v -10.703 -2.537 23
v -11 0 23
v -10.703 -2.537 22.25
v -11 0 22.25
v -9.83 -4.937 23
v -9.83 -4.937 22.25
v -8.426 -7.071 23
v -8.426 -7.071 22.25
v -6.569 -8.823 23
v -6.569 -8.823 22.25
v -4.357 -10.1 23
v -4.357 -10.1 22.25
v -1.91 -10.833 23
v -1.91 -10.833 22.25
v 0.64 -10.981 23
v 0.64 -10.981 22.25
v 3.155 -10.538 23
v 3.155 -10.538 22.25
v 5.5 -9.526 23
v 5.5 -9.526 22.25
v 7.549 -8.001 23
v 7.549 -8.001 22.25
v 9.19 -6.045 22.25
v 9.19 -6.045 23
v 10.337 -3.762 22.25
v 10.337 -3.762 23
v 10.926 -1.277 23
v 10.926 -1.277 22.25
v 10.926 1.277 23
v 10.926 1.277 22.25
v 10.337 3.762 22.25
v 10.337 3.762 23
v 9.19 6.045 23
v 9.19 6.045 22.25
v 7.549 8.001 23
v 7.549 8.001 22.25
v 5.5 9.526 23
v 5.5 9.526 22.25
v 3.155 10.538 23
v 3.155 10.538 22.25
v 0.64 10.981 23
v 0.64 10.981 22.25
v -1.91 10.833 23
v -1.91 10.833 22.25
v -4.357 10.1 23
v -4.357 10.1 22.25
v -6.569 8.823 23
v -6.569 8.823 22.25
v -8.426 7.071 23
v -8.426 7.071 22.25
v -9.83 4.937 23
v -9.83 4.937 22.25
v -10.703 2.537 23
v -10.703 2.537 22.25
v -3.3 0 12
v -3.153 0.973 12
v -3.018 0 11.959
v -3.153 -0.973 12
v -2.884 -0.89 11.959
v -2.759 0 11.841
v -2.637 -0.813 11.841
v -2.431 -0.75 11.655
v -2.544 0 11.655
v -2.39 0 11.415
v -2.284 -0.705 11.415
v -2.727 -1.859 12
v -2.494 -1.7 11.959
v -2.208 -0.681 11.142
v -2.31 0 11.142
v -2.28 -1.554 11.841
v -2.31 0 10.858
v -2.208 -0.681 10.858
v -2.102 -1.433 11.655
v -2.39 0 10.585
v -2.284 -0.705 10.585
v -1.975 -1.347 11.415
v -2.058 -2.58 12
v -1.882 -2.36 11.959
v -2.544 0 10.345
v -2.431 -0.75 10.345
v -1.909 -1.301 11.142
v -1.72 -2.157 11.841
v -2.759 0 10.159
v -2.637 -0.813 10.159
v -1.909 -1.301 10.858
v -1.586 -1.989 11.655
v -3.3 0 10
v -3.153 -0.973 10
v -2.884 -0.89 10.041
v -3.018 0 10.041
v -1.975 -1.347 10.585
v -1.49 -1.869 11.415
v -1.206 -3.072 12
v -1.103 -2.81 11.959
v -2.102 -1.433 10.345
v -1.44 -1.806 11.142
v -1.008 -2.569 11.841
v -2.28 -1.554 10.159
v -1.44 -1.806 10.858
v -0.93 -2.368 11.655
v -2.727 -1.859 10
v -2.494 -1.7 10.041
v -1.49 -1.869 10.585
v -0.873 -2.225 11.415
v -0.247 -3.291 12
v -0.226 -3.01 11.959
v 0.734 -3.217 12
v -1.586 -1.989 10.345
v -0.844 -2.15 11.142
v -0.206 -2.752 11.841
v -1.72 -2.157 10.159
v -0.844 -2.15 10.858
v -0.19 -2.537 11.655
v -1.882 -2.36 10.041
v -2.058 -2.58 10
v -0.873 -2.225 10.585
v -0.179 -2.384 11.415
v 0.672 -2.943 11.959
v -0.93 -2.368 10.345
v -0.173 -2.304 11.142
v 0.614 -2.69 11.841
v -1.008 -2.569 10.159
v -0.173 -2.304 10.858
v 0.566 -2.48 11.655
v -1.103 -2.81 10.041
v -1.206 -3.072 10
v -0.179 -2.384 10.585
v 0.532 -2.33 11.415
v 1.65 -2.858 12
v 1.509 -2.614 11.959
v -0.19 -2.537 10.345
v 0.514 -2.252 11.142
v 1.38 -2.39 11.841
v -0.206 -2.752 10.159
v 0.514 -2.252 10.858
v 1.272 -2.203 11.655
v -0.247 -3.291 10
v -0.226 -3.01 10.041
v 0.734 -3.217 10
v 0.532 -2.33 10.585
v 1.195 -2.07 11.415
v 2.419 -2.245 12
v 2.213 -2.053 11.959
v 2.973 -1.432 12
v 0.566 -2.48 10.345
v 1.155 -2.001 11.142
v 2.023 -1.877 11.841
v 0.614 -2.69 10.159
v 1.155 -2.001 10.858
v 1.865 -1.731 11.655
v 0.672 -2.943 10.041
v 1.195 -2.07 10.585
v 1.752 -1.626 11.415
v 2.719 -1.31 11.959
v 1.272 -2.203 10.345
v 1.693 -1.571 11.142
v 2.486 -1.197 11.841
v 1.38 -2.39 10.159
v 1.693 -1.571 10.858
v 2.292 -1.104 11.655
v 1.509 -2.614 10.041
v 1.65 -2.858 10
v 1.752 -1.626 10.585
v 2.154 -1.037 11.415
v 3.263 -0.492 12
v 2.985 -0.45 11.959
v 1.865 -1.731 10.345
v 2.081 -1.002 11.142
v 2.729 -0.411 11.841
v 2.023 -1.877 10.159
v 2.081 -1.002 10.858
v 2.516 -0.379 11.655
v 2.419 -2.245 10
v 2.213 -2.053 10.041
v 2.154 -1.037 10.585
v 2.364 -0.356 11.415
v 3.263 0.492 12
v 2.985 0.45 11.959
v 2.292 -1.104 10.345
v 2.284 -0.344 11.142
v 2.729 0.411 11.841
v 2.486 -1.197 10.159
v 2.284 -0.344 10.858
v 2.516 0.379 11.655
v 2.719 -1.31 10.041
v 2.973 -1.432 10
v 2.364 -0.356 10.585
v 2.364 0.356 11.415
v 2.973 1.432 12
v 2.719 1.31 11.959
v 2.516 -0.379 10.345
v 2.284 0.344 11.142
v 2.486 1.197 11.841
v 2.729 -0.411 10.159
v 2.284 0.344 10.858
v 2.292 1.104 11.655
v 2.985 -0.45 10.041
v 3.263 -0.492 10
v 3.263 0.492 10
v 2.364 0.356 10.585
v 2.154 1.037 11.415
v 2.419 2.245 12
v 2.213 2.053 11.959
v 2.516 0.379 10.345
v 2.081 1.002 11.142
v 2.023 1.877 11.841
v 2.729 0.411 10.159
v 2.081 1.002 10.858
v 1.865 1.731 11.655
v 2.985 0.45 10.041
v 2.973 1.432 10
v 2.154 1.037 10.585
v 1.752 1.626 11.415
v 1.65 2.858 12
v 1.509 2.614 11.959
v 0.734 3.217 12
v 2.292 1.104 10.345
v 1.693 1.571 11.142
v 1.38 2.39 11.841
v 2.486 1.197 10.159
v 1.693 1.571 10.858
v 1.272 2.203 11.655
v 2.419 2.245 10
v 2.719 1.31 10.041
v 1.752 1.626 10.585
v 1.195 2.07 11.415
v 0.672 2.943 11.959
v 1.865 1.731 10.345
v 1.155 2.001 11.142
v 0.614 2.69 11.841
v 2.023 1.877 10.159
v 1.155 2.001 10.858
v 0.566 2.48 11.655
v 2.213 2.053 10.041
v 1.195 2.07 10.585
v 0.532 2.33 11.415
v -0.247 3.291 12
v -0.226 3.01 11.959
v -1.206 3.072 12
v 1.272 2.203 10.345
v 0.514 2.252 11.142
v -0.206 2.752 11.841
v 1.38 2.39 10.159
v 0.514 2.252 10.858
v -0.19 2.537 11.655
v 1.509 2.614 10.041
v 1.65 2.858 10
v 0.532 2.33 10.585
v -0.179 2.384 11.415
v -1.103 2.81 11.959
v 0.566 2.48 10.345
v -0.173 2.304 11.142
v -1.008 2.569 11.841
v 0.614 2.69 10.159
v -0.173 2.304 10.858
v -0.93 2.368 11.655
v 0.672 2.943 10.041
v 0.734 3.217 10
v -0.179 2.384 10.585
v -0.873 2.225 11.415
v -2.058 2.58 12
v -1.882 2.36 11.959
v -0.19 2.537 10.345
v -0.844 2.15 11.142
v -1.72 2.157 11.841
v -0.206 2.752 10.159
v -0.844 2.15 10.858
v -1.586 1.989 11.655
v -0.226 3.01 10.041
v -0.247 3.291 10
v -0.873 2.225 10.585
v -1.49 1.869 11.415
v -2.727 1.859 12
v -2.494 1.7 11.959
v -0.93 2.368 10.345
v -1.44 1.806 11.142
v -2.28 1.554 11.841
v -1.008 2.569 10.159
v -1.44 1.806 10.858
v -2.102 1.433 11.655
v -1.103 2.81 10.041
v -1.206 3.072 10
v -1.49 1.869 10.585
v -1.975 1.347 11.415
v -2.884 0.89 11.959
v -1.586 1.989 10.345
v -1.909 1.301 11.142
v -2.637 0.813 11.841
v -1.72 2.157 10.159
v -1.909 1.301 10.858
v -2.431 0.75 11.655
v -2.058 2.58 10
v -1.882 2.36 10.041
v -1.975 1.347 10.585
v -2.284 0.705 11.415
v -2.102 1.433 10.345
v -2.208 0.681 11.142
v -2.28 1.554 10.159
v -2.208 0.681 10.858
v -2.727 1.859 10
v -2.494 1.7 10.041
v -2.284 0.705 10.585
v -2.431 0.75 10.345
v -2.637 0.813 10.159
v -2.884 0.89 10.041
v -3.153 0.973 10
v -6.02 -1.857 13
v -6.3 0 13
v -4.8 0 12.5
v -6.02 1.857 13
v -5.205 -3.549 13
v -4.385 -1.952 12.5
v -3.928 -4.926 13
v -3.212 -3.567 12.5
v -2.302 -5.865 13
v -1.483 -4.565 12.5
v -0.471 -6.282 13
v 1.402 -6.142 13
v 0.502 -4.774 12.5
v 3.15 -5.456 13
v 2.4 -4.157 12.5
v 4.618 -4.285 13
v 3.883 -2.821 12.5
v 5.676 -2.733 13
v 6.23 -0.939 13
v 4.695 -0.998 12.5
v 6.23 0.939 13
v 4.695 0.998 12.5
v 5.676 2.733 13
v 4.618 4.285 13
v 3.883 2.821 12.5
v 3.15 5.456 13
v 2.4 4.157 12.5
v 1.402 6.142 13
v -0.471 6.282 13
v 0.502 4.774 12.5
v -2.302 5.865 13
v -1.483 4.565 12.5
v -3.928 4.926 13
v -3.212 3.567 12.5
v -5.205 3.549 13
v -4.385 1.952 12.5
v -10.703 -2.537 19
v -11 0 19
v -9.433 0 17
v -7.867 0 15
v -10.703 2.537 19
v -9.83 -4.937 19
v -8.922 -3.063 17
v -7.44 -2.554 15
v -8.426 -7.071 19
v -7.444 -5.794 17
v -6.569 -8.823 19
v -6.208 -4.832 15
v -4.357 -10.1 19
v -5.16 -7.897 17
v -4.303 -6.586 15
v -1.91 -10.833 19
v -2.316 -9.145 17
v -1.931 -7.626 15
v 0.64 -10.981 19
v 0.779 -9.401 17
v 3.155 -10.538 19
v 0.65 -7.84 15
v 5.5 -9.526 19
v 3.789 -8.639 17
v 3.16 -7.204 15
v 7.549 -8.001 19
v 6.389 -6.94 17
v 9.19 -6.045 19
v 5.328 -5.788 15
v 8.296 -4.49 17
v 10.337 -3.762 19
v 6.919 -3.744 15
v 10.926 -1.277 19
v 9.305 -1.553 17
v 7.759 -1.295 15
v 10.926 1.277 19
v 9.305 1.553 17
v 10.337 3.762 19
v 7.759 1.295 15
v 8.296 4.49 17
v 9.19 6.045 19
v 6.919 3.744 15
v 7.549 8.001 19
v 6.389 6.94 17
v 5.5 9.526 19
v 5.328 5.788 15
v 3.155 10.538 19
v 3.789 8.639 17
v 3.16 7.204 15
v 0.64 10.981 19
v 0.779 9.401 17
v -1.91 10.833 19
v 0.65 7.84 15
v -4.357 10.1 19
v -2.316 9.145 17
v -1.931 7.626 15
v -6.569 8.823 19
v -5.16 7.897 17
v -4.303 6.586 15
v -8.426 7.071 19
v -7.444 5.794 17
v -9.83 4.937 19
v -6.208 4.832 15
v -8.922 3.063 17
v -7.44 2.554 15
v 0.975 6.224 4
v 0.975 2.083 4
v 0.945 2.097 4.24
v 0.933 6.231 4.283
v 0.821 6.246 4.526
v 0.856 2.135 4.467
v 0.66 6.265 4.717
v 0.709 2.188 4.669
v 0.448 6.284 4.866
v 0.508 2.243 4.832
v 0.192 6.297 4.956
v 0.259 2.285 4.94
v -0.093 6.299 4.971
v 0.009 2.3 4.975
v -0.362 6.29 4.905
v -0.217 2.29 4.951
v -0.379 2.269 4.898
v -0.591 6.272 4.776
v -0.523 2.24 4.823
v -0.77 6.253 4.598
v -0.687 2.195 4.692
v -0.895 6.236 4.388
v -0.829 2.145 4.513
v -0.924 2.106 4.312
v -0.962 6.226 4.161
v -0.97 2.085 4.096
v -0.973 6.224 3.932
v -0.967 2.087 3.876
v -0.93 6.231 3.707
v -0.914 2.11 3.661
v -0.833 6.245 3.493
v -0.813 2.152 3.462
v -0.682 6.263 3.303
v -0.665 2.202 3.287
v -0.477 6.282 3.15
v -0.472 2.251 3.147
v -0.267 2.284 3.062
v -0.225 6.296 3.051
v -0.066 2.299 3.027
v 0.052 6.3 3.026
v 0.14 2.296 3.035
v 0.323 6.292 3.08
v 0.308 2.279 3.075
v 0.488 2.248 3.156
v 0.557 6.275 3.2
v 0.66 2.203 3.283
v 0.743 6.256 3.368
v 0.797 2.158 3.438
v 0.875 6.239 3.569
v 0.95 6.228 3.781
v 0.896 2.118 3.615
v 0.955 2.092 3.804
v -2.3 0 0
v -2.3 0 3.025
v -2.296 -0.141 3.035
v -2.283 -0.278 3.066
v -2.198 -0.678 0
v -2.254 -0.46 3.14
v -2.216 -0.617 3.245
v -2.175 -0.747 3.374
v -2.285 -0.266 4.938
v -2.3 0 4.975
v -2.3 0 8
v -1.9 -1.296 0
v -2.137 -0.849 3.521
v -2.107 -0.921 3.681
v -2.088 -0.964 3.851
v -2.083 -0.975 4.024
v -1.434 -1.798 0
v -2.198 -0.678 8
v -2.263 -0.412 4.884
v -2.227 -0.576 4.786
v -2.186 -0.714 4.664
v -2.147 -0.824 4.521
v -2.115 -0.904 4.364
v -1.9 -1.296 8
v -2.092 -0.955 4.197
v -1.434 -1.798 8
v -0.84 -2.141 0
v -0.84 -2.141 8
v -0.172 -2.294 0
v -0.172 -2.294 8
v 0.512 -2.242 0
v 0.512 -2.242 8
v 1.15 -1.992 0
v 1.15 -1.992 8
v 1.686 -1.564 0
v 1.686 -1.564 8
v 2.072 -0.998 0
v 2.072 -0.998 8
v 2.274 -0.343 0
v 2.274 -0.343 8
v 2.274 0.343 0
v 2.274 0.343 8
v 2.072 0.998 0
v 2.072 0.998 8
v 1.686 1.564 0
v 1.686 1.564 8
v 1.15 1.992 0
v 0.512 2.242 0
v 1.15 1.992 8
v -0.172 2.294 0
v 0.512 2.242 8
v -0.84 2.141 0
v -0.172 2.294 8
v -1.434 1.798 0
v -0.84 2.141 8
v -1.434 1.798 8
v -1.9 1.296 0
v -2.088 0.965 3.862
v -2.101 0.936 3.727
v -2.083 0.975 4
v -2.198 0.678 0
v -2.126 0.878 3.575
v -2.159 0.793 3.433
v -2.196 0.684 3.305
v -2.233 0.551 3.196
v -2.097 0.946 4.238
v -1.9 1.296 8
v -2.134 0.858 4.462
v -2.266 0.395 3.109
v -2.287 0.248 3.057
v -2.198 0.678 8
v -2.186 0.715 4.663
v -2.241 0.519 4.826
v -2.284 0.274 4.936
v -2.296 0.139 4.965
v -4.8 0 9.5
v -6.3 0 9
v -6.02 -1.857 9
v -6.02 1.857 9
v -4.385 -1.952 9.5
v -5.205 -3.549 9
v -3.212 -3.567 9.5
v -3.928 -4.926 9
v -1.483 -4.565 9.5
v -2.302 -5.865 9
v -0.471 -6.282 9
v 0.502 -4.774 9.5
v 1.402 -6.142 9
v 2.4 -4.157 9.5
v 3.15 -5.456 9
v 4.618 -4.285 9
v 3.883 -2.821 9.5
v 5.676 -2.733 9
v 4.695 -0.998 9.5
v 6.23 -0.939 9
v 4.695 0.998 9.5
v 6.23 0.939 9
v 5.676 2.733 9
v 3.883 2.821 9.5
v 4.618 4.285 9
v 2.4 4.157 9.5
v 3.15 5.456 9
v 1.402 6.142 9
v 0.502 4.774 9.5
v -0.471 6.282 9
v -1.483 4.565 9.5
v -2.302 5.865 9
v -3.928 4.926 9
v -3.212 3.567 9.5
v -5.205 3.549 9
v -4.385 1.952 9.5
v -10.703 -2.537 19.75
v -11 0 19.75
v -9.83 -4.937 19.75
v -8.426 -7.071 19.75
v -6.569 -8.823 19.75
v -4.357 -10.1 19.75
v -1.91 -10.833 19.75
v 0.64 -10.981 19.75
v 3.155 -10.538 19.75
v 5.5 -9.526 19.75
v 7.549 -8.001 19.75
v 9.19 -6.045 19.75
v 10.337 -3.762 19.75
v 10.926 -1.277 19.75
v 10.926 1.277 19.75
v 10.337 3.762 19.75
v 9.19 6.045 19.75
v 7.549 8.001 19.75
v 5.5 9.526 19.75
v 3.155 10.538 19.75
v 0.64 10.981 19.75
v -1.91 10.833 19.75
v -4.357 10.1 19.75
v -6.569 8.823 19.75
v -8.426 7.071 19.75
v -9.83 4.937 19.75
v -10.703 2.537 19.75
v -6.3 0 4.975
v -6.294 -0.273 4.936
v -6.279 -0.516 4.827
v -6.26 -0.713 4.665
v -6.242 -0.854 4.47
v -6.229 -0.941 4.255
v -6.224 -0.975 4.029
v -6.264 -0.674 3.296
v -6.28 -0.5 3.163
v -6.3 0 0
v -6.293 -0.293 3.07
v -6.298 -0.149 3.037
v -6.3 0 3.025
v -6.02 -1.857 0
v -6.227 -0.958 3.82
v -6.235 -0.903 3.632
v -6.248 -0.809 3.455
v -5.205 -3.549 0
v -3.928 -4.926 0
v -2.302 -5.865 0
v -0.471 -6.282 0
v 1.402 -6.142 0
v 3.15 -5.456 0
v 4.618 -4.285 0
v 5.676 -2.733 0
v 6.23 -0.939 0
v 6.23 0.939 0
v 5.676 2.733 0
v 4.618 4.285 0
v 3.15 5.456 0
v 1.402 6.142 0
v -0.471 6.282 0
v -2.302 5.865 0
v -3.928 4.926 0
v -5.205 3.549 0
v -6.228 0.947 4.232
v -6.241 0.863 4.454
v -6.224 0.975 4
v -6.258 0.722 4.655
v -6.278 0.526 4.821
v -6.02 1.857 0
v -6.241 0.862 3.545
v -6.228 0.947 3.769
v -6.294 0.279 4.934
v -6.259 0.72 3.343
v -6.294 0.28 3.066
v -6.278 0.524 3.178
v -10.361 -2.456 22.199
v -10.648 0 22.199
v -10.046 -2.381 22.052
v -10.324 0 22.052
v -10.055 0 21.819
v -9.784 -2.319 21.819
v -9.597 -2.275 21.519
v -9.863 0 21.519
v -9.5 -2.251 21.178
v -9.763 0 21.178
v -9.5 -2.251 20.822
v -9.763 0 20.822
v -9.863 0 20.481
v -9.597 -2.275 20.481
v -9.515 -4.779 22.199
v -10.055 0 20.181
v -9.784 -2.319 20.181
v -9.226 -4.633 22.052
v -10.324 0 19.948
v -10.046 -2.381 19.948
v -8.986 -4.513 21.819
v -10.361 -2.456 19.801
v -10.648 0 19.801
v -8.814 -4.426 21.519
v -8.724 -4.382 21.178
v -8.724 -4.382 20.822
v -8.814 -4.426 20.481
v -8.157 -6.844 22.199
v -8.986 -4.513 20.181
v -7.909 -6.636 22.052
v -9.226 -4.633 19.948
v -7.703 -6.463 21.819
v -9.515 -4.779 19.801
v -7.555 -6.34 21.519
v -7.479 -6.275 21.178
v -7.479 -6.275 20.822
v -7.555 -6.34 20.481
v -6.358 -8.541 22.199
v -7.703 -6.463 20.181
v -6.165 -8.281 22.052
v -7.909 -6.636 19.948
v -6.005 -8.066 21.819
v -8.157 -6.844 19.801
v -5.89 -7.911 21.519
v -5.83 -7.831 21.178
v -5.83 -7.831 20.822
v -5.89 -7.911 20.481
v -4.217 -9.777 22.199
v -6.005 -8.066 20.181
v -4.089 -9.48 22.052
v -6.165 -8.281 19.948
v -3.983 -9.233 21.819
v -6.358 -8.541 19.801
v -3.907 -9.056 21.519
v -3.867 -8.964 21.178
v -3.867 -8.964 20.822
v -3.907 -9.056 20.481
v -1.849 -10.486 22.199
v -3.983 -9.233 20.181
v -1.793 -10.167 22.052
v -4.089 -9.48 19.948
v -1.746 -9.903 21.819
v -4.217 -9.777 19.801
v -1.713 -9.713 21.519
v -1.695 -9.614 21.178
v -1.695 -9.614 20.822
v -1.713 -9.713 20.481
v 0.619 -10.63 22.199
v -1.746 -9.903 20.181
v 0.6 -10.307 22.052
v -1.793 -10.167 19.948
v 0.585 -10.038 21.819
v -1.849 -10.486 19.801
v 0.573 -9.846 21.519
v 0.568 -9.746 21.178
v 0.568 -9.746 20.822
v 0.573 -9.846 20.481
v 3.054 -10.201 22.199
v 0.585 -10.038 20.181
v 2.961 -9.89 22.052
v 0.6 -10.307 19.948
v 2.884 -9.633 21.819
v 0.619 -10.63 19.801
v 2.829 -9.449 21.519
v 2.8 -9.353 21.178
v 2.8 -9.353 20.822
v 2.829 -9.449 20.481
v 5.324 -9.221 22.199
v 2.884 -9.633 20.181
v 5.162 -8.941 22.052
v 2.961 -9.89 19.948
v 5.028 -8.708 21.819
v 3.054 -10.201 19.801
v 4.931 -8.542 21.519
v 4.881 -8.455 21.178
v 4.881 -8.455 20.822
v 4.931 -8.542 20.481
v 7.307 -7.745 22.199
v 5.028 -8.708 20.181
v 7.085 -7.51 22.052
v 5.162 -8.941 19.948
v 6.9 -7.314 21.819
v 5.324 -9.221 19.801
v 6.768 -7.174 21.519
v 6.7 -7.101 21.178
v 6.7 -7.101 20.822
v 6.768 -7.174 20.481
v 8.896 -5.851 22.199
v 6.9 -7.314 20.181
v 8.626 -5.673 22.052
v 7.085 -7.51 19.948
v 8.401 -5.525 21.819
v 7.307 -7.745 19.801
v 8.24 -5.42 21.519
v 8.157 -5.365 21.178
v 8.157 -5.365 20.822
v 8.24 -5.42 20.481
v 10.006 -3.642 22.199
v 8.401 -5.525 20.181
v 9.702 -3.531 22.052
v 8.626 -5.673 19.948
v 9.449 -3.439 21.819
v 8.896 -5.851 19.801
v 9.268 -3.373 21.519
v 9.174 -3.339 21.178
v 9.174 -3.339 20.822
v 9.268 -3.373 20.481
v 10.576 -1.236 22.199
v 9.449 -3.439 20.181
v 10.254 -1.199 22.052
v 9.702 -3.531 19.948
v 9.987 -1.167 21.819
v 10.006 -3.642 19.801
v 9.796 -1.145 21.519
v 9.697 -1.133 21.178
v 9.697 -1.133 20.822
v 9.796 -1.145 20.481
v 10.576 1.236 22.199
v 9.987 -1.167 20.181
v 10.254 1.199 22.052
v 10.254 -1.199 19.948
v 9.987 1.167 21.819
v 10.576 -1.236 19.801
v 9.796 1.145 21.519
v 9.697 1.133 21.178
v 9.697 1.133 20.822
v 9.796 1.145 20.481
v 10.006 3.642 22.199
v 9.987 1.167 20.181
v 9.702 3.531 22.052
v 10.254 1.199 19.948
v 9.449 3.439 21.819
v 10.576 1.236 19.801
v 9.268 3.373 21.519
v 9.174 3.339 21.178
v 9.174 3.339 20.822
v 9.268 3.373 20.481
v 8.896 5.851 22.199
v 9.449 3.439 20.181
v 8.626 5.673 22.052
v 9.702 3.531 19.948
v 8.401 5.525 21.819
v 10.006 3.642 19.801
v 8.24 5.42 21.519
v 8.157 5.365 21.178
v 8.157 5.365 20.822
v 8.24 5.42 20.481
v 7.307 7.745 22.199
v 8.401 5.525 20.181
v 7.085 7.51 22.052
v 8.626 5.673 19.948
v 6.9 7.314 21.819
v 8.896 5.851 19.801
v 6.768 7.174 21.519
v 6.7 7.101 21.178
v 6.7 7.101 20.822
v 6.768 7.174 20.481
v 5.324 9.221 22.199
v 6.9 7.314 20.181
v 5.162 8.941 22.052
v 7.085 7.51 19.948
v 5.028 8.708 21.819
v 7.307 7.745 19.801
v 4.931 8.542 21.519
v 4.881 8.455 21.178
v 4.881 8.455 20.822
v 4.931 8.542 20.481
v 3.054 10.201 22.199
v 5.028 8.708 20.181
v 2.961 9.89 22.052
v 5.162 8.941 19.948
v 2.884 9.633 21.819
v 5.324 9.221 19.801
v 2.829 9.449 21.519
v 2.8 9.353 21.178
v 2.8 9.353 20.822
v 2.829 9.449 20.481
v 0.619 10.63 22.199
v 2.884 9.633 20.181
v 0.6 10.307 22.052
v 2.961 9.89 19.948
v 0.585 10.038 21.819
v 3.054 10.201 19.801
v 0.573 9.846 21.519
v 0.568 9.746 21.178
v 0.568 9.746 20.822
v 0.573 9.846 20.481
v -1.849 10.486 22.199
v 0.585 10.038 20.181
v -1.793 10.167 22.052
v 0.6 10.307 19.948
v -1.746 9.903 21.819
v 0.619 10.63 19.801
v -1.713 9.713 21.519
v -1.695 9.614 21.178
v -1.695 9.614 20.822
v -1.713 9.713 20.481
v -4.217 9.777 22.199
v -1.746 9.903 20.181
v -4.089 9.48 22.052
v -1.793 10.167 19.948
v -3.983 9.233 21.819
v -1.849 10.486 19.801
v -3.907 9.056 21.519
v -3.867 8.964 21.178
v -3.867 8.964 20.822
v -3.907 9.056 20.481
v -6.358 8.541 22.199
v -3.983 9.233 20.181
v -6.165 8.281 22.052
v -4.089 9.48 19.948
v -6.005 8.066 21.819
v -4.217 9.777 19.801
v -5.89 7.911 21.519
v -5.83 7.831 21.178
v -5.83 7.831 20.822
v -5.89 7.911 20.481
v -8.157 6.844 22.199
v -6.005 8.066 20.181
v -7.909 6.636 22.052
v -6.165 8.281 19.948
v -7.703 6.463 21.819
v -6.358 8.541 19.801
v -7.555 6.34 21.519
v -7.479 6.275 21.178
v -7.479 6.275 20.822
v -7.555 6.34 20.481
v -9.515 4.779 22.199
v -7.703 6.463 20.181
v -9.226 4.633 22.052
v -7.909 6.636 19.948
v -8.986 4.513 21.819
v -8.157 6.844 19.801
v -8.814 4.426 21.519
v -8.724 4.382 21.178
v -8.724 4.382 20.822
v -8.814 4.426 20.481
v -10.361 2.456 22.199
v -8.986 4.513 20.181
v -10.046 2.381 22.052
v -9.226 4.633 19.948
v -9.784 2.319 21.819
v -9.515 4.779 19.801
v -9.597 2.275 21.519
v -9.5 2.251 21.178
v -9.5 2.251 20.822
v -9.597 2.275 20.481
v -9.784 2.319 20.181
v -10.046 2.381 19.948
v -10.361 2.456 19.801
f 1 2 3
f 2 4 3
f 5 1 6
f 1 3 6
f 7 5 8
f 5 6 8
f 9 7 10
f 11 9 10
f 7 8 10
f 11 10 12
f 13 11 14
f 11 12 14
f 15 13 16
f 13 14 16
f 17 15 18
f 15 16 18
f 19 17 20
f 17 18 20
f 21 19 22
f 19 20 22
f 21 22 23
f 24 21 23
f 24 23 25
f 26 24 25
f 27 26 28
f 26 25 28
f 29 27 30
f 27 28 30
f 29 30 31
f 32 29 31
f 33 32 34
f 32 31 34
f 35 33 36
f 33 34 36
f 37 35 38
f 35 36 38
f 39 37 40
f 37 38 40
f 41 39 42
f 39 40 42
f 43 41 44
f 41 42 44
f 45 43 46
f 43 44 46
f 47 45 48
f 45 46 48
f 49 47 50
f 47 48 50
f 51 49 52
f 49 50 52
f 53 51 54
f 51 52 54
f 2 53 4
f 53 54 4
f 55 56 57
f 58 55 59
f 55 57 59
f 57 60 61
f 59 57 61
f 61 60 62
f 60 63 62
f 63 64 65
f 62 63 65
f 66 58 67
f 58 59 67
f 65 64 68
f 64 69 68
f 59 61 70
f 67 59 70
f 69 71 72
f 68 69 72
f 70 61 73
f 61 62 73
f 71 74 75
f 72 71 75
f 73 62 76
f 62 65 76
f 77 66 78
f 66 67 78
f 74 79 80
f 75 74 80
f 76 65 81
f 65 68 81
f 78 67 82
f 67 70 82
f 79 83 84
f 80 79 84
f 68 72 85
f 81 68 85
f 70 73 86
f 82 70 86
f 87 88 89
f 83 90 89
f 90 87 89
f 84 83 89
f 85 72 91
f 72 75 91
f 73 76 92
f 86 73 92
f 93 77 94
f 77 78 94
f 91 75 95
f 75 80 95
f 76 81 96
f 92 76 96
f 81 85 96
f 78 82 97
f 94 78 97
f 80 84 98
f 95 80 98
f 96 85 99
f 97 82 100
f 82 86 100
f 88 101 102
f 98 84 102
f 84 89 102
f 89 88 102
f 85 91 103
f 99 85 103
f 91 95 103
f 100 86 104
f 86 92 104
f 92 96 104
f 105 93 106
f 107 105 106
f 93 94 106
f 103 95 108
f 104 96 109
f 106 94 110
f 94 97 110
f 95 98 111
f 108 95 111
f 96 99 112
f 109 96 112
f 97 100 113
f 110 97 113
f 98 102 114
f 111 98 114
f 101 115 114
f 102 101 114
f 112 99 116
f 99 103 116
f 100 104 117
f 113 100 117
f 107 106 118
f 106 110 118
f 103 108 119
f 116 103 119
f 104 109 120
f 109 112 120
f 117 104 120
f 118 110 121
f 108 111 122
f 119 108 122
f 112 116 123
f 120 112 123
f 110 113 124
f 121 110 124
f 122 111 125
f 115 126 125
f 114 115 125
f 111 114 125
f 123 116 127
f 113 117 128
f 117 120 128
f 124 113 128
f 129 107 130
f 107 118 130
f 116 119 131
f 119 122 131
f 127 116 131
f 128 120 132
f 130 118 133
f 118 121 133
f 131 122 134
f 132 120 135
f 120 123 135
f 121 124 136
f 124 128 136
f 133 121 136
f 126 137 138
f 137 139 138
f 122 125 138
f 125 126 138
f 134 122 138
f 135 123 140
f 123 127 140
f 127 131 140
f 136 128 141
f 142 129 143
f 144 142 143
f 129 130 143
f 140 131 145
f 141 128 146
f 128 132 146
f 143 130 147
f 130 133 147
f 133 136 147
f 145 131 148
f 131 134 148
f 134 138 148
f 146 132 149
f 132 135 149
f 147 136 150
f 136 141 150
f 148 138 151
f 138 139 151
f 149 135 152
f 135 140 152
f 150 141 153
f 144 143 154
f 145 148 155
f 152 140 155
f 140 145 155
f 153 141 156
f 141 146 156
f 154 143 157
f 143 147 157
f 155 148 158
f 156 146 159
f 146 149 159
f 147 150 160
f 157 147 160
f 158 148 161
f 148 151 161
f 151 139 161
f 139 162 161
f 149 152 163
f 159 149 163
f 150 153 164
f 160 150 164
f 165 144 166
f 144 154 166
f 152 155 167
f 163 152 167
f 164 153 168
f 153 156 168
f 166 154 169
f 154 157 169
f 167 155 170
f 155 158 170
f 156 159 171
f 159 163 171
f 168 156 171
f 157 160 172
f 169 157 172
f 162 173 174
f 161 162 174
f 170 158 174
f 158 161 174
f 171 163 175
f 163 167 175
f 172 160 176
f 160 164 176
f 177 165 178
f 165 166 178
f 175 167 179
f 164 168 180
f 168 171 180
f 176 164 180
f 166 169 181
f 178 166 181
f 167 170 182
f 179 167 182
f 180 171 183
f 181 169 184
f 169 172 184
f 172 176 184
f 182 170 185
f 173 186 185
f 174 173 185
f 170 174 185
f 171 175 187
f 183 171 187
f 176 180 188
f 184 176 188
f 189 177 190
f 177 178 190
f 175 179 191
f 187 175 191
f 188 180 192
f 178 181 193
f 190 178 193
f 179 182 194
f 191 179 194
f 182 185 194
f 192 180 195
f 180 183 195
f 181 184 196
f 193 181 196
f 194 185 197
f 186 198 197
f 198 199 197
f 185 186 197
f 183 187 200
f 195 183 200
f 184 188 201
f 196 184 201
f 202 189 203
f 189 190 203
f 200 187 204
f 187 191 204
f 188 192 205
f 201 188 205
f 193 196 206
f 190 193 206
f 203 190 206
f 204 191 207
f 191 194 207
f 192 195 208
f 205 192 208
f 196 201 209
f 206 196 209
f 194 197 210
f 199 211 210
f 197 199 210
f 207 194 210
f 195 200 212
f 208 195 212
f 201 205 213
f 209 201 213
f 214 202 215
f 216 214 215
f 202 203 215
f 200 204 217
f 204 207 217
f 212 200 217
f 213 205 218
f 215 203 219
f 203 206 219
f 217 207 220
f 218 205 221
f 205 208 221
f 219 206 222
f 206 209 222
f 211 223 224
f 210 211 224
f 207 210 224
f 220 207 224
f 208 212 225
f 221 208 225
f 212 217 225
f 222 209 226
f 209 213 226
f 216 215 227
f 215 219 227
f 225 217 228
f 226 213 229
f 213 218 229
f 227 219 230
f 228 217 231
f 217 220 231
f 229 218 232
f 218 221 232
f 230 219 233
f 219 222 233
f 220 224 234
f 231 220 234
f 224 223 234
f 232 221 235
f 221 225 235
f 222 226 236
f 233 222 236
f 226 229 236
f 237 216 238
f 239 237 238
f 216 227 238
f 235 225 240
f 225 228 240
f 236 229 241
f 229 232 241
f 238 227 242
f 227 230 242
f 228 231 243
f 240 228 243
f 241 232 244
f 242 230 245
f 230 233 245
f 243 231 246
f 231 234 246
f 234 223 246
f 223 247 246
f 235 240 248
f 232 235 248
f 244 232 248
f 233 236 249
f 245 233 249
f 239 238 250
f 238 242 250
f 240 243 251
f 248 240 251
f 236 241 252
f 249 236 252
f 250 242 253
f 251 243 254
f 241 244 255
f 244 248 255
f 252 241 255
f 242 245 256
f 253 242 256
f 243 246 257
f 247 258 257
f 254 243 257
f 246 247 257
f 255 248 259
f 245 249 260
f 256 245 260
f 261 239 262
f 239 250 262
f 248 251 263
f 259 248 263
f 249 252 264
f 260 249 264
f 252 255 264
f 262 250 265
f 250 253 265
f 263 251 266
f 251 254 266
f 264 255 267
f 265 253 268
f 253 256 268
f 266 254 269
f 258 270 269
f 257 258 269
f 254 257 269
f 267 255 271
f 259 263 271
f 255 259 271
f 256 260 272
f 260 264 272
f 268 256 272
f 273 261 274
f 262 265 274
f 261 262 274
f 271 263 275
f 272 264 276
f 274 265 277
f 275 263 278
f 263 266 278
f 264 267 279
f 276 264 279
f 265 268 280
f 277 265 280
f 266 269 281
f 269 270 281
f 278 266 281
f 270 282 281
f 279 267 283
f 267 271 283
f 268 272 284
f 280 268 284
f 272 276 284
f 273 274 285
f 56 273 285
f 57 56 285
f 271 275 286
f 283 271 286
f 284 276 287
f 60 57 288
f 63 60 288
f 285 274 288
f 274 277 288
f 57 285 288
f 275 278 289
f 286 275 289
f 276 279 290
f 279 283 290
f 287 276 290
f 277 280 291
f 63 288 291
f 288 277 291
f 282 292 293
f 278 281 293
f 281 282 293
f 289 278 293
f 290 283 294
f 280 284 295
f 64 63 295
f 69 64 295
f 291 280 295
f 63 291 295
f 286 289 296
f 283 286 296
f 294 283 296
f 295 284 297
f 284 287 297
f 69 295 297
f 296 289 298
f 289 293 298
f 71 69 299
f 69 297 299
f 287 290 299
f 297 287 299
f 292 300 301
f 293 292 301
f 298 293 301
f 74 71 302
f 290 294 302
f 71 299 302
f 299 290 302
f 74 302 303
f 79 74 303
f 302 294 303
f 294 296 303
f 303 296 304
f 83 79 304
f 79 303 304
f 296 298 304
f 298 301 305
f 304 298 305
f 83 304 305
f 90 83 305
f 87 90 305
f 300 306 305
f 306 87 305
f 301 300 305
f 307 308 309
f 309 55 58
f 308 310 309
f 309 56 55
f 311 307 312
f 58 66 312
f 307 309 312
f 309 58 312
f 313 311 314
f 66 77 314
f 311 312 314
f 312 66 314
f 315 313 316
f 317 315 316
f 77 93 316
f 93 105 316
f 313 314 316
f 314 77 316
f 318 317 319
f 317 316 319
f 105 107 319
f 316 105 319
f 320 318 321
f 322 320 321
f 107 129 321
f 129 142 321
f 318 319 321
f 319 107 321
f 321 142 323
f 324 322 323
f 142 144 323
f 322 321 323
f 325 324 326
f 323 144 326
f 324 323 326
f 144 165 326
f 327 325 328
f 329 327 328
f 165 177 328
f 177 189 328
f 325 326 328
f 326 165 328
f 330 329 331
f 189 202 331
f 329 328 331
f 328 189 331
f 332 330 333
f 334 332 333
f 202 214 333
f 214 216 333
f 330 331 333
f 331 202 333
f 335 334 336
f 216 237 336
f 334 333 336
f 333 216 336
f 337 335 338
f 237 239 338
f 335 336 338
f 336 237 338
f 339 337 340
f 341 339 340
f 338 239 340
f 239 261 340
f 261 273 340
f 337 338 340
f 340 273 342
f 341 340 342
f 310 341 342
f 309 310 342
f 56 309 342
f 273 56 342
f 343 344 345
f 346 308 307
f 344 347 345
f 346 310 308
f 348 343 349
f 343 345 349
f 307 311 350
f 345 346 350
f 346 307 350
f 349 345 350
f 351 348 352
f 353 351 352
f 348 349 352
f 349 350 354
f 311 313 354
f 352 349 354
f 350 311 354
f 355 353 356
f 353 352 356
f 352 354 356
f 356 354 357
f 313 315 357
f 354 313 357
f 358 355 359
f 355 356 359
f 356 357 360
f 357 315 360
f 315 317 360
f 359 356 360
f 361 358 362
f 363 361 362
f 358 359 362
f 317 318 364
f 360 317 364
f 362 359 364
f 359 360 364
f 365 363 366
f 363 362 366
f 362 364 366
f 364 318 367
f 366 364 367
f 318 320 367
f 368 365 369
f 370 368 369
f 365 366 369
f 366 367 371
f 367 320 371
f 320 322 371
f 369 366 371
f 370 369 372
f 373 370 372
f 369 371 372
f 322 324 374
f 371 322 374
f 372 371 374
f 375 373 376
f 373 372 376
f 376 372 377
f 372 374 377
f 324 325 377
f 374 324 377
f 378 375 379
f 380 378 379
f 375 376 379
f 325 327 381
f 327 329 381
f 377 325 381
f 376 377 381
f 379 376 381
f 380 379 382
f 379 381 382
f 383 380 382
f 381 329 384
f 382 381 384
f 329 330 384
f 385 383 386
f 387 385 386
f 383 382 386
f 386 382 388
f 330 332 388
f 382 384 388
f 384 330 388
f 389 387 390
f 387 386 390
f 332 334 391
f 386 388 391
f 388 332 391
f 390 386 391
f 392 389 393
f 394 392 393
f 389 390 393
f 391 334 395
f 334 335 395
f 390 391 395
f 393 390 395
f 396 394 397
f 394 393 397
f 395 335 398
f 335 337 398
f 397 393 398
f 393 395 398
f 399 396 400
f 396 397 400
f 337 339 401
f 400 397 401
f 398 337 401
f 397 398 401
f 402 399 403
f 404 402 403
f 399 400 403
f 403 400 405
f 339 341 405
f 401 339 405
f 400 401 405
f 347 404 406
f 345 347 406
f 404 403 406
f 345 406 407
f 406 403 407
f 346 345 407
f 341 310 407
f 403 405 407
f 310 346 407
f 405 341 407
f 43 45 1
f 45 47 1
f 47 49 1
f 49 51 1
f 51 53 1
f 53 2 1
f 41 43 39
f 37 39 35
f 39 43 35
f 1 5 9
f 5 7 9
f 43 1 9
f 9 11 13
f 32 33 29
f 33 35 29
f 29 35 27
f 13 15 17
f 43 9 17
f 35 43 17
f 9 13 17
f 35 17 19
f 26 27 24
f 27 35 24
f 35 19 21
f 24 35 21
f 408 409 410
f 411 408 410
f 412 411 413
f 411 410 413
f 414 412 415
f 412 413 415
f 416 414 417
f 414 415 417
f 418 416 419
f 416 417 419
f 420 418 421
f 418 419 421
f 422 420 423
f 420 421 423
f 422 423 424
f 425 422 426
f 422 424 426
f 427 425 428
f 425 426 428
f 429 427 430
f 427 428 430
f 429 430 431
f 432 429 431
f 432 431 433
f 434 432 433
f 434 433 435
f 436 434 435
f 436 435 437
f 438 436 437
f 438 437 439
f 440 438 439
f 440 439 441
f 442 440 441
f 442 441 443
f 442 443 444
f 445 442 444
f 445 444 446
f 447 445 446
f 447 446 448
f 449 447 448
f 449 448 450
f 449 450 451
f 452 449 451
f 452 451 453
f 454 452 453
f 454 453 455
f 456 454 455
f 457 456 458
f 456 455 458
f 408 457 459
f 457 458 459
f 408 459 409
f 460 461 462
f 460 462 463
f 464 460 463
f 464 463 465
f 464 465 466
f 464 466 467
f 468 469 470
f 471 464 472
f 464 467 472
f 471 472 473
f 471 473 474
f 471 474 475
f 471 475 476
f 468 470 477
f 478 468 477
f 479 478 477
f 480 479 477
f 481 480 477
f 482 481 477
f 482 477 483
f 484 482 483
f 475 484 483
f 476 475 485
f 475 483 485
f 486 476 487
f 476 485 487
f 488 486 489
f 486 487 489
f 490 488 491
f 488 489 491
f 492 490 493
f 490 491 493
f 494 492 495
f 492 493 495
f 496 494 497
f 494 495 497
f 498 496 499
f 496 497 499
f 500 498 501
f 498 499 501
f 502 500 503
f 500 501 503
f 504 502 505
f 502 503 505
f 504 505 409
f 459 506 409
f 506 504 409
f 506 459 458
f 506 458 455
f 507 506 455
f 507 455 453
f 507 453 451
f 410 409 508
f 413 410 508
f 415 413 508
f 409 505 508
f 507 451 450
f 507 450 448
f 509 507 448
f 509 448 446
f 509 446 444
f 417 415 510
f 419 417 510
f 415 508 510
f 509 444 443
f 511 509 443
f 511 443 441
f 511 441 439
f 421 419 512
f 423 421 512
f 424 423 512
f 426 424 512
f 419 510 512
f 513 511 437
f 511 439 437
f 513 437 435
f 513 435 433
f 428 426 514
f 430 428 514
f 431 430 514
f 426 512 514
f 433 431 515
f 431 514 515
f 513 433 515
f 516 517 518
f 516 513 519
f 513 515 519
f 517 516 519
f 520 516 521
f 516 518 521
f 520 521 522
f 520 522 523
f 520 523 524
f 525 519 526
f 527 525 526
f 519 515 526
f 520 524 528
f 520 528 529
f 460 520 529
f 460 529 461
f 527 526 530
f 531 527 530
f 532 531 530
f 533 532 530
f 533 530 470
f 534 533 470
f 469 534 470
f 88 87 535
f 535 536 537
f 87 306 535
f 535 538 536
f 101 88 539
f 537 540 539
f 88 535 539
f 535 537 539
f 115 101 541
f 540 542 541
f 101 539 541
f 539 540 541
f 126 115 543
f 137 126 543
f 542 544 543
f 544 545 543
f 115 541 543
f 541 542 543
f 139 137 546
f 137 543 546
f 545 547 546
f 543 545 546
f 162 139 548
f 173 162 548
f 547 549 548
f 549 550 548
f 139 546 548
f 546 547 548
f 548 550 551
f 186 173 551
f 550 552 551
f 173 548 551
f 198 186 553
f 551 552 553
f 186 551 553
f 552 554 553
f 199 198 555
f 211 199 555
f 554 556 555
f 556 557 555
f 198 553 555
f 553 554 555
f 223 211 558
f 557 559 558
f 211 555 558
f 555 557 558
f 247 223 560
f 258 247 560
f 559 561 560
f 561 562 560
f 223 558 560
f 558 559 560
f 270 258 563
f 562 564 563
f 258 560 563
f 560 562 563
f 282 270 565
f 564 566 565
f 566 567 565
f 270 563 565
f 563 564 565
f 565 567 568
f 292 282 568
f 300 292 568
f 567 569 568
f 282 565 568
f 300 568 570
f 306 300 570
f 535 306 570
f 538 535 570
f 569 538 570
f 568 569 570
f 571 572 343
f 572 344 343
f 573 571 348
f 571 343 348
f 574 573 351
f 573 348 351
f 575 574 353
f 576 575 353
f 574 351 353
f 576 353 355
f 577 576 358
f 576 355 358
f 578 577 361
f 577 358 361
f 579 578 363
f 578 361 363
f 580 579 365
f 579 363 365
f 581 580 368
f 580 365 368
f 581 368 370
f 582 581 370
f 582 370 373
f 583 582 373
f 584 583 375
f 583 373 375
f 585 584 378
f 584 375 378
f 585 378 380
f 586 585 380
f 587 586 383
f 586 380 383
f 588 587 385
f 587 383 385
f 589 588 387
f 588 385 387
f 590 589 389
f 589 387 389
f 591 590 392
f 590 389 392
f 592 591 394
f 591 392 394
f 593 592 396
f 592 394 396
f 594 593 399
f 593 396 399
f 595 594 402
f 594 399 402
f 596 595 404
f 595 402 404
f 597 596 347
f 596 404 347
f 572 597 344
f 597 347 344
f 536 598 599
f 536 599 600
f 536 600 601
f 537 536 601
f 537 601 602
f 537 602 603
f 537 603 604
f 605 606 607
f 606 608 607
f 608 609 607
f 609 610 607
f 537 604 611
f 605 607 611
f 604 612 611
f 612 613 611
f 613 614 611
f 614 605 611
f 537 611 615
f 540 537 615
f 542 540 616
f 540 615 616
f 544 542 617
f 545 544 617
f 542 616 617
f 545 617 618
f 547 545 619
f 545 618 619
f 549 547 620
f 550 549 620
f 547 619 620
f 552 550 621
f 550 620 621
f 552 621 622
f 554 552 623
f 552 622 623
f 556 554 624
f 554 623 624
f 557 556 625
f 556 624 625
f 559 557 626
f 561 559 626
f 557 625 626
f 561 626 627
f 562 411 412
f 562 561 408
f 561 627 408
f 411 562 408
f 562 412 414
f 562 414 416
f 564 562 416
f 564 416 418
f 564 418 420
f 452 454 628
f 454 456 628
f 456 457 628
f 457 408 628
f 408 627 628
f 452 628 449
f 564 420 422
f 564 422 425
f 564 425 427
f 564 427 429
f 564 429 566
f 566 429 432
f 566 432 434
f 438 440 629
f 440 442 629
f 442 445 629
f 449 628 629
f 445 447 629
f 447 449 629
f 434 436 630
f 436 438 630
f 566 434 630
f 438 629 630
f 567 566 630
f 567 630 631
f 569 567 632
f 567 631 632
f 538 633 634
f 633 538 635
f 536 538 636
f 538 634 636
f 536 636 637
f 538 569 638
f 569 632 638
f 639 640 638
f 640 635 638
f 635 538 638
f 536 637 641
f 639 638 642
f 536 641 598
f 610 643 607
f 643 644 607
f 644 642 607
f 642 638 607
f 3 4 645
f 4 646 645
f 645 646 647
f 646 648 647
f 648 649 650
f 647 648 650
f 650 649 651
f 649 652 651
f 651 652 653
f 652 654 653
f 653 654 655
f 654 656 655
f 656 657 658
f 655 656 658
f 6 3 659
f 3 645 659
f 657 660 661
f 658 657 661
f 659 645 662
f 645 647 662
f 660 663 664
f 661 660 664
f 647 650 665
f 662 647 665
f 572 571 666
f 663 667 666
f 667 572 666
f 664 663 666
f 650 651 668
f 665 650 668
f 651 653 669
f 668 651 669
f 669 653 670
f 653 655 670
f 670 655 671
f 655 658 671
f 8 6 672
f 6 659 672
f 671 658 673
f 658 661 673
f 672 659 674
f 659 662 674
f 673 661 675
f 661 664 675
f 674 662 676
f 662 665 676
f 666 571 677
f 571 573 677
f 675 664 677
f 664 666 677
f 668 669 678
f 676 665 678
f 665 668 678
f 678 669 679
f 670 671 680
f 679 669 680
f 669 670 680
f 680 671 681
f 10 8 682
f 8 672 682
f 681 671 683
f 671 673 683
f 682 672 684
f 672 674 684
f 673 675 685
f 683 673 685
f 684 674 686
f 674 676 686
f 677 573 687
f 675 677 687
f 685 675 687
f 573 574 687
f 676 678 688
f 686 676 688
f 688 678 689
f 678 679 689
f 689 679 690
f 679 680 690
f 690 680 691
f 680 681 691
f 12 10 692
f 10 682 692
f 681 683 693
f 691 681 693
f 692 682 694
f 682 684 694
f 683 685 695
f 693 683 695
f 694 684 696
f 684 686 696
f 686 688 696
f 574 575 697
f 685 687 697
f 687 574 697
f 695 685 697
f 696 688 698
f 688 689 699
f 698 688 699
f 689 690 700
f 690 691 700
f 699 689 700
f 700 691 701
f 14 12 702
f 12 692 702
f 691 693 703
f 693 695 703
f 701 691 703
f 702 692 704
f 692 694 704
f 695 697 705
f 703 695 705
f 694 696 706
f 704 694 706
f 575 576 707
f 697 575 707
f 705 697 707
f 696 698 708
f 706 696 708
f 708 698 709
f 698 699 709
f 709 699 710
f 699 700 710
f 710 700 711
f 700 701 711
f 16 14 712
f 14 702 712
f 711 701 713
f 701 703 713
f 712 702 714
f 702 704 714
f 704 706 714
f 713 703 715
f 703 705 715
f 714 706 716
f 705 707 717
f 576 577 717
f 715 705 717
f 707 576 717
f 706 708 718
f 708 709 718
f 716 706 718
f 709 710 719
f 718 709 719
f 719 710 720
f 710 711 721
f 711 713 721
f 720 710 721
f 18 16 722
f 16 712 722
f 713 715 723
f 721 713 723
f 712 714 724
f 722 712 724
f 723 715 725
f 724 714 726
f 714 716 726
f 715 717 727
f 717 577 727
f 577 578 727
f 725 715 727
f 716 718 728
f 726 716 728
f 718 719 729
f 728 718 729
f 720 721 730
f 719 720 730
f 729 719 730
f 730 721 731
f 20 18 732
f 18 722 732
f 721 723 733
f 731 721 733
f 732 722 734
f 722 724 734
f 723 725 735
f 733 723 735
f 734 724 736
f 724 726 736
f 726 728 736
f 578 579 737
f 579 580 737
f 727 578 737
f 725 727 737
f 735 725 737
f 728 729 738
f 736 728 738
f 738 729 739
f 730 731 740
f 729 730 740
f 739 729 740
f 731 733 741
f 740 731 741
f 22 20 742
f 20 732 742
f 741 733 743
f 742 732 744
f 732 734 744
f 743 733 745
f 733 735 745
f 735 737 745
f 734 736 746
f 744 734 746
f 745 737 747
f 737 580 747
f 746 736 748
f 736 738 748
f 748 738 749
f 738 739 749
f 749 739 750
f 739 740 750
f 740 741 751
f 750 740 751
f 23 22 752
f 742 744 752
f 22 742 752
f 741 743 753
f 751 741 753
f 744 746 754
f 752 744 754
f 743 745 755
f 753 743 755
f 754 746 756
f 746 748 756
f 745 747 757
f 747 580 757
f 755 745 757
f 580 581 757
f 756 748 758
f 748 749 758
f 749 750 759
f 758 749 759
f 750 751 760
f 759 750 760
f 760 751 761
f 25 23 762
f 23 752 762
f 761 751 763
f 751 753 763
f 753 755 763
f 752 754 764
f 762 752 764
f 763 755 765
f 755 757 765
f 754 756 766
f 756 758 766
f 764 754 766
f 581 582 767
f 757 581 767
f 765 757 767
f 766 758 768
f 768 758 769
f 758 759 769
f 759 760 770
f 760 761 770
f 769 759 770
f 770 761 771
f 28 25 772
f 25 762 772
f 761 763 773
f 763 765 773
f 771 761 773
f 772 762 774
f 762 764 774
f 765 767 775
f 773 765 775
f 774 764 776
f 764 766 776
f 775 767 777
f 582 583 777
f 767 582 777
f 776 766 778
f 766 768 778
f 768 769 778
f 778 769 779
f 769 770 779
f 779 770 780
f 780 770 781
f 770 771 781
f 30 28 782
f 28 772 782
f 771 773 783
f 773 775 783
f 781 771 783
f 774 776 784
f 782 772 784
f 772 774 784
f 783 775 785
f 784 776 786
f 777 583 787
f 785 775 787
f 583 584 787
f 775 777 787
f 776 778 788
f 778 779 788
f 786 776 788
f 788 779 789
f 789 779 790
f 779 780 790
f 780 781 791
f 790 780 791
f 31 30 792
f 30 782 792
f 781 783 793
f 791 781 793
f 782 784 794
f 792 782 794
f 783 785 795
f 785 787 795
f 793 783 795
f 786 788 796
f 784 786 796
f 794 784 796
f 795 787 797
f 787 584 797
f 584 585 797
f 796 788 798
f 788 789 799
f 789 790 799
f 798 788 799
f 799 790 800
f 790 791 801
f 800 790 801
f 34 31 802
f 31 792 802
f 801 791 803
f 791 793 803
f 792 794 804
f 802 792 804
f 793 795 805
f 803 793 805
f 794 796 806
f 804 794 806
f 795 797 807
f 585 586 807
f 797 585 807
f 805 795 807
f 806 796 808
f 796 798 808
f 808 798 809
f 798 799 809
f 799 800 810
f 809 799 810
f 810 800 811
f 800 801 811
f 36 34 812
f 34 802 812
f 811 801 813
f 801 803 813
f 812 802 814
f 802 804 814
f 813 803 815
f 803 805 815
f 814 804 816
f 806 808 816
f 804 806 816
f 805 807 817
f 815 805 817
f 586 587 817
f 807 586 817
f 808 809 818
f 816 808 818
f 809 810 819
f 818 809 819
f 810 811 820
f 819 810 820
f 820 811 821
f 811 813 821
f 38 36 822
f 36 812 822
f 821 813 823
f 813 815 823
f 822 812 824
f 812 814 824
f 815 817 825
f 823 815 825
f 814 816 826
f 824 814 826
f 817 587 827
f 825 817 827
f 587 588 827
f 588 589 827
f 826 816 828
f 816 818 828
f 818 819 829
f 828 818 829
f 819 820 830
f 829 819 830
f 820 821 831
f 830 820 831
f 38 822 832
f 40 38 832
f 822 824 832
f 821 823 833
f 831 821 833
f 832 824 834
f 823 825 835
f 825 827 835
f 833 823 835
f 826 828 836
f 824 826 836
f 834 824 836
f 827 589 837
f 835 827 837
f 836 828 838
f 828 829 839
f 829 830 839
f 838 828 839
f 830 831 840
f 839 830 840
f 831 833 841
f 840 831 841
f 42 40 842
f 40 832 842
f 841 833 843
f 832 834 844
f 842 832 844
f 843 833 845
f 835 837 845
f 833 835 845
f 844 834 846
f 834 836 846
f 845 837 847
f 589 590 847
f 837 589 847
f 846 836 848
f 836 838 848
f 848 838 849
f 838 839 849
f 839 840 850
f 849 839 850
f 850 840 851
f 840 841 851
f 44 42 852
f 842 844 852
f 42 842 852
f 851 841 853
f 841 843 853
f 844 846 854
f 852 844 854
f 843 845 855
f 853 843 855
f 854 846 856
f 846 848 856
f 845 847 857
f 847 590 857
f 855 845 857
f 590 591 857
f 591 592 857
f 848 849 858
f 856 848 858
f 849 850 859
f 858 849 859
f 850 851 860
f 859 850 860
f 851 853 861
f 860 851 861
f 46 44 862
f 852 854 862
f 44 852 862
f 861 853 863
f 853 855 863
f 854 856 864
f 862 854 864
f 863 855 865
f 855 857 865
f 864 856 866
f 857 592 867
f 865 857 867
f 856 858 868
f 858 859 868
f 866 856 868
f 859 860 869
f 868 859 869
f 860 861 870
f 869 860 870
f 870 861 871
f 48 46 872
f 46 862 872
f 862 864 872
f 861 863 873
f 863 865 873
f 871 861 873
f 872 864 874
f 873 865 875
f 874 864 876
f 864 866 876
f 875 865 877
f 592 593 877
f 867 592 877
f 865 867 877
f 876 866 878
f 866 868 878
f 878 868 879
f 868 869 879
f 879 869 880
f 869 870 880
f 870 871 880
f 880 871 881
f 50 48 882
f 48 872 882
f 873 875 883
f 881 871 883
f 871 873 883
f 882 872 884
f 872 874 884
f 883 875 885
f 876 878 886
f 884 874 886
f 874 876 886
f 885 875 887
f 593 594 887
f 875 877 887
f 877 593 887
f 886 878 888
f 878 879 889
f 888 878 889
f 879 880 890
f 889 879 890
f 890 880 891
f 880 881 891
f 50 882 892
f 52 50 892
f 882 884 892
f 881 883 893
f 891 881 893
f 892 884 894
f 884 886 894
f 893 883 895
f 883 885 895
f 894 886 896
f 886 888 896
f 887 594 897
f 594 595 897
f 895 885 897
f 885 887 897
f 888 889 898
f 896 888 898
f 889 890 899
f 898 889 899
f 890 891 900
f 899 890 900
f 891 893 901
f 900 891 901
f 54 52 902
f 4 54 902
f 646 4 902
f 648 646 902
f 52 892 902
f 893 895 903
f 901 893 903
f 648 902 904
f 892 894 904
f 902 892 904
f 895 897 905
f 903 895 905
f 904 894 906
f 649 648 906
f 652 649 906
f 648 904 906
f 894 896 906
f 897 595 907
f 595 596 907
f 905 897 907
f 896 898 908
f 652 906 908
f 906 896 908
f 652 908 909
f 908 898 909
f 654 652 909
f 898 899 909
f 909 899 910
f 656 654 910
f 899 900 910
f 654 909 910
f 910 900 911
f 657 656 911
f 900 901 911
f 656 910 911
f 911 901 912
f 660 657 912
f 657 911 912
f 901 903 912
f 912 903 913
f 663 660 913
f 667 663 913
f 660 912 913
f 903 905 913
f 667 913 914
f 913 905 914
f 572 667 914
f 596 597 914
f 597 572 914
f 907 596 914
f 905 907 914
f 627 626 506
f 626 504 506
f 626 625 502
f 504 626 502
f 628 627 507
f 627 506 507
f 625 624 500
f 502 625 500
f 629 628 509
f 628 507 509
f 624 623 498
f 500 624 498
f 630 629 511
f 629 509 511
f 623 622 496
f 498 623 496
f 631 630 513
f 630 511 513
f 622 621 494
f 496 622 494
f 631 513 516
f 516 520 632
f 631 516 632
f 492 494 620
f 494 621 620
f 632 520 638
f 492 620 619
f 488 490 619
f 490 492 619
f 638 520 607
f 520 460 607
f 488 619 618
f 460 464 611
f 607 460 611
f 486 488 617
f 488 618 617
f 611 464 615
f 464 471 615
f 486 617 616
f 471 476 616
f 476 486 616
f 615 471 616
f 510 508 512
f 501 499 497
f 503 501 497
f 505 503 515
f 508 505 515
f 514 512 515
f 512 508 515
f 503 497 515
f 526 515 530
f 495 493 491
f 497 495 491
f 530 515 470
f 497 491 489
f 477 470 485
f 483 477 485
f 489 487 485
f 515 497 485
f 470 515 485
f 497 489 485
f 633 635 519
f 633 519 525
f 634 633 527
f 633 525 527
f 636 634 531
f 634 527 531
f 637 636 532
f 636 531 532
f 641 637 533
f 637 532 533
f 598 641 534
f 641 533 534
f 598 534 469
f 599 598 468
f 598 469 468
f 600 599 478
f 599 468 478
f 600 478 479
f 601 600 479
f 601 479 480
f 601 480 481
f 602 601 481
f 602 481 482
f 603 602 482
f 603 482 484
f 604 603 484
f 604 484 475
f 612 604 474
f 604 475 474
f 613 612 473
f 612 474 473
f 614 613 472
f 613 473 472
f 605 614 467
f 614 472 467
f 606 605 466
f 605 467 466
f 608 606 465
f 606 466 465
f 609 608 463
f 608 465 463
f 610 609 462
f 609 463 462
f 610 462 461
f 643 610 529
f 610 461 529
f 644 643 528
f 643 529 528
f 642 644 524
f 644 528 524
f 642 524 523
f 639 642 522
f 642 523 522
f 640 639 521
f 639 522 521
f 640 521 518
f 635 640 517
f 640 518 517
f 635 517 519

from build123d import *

# Parameters (mm, degrees)
F0_R     = 0.975
F2_DEPTH = 6.6
F3_R     = 0.975
F4_DEPTH = 6.6


with BuildPart() as f1:
    # F0 (on Front) → F1 (revolve)
    with BuildSketch(Plane.XZ):
        with BuildLine():
            Line((-6.3, 0), (-2.3, 0))
            Line((-2.3, 0), (-2.3, 8))
            Line((-2.3, 8), (0, 8))
            Line((0, 8), (0, 23))
            Line((0, 23), (-11, 23))
            Line((-11, 23), (-11, 22.25))
            ThreePointArc((-11, 22.25), (-9.75, 21), (-11, 19.75))
            Line((-11, 19.75), (-11, 19))
            Line((-11, 19), (-6.3, 13))
            Line((-6.3, 13), (-3.3, 12))
            ThreePointArc((-3.3, 12), (-2.3, 11), (-3.3, 10))
            Line((-3.3, 10), (-6.3, 9))
            Line((-6.3, 9), (-6.3, 0))
        make_face()
    revolve(axis=Axis((0, 0, 15.5), (0, 0, 1)))

    # F0 (on Front) → F2 (cut)
    with BuildSketch(Plane.XZ):
        with Locations((0, 4)):
            Circle(F0_R)
    extrude(amount=-F2_DEPTH, mode=Mode.SUBTRACT)

    # F3 (on Right) → F4 (cut)
    with BuildSketch(Plane.YZ):
        with Locations((0, 4)):
            Circle(F3_R)
    extrude(amount=-F4_DEPTH, mode=Mode.SUBTRACT)


solid = f1.part
